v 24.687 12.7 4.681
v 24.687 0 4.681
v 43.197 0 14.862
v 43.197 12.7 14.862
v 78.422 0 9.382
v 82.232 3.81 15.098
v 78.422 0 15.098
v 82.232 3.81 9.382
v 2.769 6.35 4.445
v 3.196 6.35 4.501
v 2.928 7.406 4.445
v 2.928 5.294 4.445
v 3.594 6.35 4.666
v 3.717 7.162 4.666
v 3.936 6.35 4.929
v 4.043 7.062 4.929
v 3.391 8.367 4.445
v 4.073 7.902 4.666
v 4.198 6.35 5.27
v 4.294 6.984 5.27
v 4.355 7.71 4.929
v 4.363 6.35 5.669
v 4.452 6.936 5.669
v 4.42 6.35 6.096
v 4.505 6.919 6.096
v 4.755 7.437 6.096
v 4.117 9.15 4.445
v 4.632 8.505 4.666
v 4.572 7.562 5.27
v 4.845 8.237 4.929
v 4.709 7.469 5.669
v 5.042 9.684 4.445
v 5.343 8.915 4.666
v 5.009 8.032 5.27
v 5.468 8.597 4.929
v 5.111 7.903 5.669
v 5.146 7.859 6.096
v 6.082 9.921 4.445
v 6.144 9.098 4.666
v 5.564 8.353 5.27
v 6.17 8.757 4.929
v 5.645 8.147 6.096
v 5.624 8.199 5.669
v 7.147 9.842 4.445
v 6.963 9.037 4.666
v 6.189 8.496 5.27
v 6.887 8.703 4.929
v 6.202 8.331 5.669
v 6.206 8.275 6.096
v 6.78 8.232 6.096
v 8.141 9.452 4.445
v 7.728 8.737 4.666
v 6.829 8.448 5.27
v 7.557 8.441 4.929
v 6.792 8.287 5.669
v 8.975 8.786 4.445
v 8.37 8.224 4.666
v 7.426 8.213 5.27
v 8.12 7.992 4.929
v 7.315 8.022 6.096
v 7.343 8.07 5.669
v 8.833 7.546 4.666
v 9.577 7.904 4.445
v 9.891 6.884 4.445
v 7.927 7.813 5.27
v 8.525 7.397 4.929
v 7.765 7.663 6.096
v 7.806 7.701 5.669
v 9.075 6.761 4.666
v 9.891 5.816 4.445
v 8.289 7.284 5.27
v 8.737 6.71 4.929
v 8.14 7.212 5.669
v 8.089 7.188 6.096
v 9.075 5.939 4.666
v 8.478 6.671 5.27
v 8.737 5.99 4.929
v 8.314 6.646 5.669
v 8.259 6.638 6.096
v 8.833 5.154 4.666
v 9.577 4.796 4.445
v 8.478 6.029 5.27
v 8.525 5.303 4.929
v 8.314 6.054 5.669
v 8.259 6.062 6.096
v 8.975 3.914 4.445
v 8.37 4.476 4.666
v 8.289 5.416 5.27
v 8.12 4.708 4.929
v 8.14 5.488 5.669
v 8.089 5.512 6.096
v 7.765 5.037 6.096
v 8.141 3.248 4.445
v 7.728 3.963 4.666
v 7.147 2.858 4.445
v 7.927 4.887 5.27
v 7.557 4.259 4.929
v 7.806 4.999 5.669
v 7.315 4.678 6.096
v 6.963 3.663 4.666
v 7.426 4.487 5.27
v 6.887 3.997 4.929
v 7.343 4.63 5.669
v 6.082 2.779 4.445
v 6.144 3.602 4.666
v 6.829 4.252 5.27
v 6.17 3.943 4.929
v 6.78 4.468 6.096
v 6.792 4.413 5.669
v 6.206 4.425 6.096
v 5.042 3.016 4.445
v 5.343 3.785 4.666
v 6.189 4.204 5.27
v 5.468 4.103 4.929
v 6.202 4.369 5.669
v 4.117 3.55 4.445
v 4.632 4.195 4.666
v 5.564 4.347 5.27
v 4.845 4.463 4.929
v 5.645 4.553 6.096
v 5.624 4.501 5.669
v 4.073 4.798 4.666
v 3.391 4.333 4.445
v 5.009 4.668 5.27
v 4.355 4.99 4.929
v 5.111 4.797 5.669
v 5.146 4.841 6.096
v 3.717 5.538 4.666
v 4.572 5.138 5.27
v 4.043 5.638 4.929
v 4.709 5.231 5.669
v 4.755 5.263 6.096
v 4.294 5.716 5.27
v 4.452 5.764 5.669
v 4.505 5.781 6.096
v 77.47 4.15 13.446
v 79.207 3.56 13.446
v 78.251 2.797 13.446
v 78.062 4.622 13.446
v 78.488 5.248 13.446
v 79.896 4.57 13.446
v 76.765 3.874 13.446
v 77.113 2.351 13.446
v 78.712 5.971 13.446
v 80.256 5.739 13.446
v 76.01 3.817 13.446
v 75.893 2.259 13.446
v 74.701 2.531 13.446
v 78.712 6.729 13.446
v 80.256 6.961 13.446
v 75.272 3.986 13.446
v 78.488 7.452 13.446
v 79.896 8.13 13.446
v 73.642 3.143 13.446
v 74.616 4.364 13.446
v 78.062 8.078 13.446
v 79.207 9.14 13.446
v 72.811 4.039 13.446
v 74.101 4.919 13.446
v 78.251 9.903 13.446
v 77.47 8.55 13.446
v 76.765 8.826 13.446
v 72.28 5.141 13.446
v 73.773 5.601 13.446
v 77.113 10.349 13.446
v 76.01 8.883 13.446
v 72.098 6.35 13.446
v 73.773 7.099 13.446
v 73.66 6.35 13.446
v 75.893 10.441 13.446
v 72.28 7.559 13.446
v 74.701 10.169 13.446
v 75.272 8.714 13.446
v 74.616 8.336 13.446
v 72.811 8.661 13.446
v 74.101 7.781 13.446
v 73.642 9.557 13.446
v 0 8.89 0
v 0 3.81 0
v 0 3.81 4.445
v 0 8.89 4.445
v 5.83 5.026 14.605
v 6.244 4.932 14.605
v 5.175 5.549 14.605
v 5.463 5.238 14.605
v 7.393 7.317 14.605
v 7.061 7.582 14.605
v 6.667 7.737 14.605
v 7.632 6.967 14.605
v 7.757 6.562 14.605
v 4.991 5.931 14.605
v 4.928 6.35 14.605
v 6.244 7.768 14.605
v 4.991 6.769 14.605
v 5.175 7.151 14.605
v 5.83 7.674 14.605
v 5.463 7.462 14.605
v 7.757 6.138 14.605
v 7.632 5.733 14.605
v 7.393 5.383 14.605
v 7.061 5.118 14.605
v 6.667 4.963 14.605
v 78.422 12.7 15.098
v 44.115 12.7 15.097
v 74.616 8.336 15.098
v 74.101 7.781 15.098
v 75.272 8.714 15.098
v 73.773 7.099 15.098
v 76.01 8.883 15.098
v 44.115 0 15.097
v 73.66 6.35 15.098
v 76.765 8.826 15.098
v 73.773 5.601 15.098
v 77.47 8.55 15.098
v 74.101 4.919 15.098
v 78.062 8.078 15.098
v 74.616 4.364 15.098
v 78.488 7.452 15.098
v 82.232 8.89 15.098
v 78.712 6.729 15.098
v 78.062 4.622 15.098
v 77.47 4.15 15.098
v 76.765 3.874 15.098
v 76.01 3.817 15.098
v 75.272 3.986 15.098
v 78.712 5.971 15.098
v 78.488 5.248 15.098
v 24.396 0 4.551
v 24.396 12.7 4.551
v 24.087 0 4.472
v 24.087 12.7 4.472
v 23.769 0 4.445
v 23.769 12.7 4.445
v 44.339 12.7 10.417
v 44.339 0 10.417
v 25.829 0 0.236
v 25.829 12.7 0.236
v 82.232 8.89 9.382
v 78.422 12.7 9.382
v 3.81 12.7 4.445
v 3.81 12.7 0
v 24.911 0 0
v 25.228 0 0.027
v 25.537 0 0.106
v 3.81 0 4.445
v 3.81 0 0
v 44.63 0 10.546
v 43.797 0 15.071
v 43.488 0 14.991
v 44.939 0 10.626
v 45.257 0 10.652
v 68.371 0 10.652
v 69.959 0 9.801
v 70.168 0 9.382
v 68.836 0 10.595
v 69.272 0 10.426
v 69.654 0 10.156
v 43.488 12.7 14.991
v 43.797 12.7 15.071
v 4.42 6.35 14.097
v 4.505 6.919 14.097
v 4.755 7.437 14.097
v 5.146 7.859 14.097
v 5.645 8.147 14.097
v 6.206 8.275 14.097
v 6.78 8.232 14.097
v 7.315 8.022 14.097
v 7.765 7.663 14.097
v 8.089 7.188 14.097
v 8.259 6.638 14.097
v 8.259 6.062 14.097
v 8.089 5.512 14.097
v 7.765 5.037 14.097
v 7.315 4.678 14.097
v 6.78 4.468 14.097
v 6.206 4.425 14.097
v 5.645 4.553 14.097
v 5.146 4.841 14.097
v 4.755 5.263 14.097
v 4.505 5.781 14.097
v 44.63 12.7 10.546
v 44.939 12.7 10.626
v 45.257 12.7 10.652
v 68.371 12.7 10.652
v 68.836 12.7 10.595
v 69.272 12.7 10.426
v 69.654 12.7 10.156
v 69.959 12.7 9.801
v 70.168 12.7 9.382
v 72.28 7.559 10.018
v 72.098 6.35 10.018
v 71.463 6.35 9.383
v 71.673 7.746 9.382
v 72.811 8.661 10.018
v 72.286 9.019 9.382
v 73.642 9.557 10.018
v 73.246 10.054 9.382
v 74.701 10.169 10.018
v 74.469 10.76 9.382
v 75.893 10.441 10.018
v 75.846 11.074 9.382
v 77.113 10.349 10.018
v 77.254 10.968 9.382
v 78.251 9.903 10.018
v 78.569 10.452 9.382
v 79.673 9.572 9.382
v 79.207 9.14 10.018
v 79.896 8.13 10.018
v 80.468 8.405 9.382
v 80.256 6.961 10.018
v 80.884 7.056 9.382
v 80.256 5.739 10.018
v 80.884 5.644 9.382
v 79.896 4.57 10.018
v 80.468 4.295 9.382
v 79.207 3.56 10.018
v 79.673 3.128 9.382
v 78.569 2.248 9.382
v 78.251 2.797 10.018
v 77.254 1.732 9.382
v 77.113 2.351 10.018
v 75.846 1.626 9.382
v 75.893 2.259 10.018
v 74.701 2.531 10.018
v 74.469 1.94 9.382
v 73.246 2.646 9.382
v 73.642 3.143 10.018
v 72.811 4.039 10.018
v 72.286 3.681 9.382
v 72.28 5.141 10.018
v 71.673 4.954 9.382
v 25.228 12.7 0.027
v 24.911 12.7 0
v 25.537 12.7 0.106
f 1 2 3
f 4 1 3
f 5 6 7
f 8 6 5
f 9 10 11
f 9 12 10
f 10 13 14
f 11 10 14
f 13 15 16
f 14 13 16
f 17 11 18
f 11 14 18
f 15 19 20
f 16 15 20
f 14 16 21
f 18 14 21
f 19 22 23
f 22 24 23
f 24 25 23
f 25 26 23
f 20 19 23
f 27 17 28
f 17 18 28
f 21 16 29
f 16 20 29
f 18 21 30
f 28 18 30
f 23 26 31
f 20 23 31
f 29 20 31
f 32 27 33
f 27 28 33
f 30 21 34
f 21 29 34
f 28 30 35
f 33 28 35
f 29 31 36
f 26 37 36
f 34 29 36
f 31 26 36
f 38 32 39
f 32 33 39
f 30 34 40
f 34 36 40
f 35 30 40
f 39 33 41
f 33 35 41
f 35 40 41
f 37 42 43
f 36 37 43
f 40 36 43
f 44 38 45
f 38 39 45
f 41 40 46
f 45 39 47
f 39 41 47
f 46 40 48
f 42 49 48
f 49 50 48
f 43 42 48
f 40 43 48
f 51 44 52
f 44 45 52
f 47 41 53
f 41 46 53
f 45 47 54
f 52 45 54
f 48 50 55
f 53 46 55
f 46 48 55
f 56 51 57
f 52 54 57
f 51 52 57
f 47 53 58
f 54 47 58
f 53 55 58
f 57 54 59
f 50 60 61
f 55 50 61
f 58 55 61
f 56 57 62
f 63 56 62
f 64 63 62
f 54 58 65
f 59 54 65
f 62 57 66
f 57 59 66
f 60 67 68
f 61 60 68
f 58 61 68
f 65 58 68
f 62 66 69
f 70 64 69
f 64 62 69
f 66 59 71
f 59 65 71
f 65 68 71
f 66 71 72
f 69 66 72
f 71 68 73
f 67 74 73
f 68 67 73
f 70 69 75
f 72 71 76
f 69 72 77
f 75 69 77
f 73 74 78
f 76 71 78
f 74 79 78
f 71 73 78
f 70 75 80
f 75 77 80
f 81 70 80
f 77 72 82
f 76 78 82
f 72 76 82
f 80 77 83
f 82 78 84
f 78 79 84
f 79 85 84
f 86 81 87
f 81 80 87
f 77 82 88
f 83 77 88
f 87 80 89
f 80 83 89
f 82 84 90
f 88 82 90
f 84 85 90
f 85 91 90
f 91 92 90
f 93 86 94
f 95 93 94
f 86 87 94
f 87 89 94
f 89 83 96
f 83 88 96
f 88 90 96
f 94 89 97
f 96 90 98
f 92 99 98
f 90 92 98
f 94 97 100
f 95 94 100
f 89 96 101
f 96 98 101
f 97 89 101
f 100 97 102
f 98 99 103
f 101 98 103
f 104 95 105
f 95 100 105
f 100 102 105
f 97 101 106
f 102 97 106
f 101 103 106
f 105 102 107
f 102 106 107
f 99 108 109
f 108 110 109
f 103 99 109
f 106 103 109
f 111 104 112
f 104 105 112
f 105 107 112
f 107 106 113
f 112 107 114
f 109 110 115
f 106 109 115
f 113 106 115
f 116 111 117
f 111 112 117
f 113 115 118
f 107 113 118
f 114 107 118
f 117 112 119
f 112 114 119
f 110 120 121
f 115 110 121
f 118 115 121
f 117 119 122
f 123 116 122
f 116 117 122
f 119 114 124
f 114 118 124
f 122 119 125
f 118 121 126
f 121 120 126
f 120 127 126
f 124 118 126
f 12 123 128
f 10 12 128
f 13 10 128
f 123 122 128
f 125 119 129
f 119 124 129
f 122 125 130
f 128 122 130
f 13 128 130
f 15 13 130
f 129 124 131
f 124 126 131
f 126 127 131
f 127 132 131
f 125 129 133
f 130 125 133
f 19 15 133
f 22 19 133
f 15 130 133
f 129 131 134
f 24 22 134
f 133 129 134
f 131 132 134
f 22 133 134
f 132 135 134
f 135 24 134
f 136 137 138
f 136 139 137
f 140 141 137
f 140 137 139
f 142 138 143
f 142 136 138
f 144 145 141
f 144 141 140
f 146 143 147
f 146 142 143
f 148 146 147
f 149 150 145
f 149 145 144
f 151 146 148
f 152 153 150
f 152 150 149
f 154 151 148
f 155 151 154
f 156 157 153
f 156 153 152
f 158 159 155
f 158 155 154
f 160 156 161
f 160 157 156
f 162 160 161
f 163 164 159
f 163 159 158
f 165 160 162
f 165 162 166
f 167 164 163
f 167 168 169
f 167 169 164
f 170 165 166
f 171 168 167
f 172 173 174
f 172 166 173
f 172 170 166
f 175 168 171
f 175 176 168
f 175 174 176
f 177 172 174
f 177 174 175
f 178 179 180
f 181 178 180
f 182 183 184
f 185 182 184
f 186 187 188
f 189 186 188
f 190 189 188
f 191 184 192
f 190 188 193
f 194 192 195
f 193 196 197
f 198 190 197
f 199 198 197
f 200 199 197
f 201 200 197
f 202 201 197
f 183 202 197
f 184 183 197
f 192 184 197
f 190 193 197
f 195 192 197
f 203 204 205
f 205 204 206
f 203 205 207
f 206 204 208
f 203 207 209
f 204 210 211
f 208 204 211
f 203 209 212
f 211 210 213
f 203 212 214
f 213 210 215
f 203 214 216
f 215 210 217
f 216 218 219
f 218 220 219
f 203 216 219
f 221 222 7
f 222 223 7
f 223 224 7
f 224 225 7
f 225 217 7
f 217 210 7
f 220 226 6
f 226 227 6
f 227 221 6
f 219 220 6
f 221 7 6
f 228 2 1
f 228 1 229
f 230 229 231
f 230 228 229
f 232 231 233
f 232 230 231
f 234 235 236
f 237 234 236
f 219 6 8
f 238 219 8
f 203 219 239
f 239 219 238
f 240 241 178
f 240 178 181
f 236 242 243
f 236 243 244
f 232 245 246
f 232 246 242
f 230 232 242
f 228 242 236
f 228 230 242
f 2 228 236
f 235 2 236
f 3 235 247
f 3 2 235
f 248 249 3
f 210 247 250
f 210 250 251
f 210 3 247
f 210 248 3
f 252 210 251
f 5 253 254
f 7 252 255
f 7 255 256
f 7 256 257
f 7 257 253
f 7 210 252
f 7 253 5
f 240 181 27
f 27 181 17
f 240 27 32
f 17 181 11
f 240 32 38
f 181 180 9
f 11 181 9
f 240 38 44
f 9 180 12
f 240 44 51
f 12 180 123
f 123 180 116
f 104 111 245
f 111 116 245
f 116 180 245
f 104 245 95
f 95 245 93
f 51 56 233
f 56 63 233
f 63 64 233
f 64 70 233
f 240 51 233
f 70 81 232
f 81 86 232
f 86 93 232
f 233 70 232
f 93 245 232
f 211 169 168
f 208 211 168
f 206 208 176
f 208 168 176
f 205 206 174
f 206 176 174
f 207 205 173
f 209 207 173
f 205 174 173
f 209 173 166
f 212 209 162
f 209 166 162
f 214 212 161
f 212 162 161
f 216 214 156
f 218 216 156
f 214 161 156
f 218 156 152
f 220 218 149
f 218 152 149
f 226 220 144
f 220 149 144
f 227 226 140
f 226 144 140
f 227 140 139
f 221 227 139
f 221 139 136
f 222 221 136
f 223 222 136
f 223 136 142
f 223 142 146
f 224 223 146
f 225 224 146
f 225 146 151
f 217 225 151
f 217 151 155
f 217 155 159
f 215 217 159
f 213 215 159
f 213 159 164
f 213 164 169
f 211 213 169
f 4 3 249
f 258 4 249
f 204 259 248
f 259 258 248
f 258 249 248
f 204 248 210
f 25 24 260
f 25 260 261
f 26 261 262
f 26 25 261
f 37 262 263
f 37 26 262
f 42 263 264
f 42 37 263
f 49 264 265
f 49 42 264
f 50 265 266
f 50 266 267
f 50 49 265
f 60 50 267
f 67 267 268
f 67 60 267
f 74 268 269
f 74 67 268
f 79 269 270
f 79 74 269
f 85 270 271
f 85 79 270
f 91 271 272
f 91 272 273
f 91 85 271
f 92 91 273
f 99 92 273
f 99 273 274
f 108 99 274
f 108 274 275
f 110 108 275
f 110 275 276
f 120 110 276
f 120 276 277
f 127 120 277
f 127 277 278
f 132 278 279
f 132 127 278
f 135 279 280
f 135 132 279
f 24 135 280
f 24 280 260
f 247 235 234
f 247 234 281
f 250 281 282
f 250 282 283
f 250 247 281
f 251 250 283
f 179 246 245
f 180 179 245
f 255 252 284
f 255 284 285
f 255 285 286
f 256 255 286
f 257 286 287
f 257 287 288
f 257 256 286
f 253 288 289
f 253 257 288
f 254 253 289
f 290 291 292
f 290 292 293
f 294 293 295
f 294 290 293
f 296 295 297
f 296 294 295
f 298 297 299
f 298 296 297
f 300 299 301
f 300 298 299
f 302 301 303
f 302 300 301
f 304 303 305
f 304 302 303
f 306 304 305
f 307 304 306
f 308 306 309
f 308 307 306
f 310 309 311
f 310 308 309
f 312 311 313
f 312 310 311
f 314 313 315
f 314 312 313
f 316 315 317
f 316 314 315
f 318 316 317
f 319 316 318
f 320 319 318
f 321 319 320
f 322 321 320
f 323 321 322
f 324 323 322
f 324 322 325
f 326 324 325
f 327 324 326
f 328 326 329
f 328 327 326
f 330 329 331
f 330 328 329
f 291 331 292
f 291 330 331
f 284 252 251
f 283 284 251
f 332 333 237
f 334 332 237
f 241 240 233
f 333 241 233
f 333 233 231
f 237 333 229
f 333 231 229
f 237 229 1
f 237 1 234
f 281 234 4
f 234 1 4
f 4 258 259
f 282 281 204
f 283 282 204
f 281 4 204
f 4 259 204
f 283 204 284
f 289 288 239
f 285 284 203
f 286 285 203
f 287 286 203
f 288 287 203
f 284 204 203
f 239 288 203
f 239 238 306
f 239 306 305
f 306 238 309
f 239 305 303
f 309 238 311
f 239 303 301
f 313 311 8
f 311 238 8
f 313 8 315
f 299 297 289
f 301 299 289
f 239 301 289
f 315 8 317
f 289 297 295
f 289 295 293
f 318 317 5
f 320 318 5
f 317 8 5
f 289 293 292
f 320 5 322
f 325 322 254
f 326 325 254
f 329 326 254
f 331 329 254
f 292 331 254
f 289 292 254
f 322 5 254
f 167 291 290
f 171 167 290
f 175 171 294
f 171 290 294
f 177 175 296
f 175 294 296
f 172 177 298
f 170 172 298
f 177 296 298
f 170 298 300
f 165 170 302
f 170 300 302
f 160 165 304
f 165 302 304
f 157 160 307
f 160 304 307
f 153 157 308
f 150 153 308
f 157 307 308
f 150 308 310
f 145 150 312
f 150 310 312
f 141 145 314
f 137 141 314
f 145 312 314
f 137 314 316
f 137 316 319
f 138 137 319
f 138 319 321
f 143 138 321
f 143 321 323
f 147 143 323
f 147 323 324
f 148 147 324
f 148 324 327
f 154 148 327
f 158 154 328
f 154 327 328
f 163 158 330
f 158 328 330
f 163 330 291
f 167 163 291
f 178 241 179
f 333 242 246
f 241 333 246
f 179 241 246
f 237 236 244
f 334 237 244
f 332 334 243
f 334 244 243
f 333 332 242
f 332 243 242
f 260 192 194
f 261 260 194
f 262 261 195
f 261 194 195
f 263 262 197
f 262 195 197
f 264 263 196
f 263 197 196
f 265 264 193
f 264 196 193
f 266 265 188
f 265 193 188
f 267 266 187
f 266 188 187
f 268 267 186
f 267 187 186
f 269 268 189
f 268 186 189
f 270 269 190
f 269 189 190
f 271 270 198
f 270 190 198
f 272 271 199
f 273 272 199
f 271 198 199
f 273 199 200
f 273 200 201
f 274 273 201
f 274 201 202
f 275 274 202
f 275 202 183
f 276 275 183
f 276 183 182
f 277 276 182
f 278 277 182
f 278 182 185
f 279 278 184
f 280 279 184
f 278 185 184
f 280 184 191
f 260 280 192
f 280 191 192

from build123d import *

# Parameters (mm, degrees)
BOSS_EXTRUDE1_DEPTH = 12.7
SKETCH2_R           = 4.1021
CUT_EXTRUDE1_DEPTH  = 4.064
SKETCH3_R           = 2.54
CUT_EXTRUDE2_DEPTH  = 85.28690538
SKETCH4_R           = 1.9304
BOSS_EXTRUDE2_DEPTH = 10.16
FILLET1_R           = 1.651
CHAMFER1_SIZE       = 3.81
FILLET2_R           = 1.905
CHAMFER2_SIZE       = 0.635
CHAMFER3_SIZE       = 0.508


with BuildPart() as part:
    # Sketch1 → Boss-Extrude1 (new body)
    with BuildSketch(Plane(origin=(0, 0, 0), x_dir=(1, 0, 0), z_dir=(0, 1, 0))):
        Polygon((0, 0), (0, -4.445), (24.258236459, -4.445), (43.625736459, -15.0975), (82.2325, -15.0975), (82.2325, -9.3825), (70.1675, -9.3825), (70.1675, -10.6525), (44.7675, -10.6525), (25.4, 0), align=None)
    extrude(amount=BOSS_EXTRUDE1_DEPTH)

    # Sketch2 → Cut-Extrude1 (cut)
    with BuildSketch(Plane(origin=(0, 0, 9.3825), x_dir=(-1, 0, 0), z_dir=(0, 0, -1))):
        with Locations((-76.2, 6.35)):
            Circle(SKETCH2_R)
    extrude(amount=-CUT_EXTRUDE1_DEPTH, mode=Mode.SUBTRACT)

    # Sketch3 → Cut-Extrude2 (cut, through all)
    with BuildSketch(Plane(origin=(0, 0, 13.4465), x_dir=(-1, 0, 0), z_dir=(0, 0, -1))):
        with Locations((-76.2, 6.35)):
            Circle(SKETCH3_R)
    extrude(amount=-CUT_EXTRUDE2_DEPTH, mode=Mode.SUBTRACT)

    # Sketch4 → Boss-Extrude2 (add)
    with BuildSketch(Plane(origin=(0, 0, 4.445), x_dir=(-1, 0, 0), z_dir=(0, 0, -1))):
        with Locations((-6.35, 6.35)):
            Circle(SKETCH4_R)
    extrude(amount=-BOSS_EXTRUDE2_DEPTH)

    # Fillet1
    fillet1_edges = [part.edges().sort_by_distance(p)[0] for p in [
        (8.2804, 6.35, 4.445),
    ]]
    fillet(fillet1_edges, radius=FILLET1_R)

    # Chamfer1
    chamfer1_edges = [part.edges().sort_by_distance(p)[0] for p in [
        (82.2325, 0, 12.24),
        (0, 0, 2.2225),
        (82.2325, 12.7, 12.24),
        (0, 12.7, 2.2225),
    ]]
    chamfer(chamfer1_edges, length=CHAMFER1_SIZE)

    # Fillet2
    # the kernel refuses this fillet: 1.905 mm, written as the material it adds along each edge
    with BuildSketch(Plane(origin=(24.258236459, 0, 4.445), x_dir=(-1, 0, 0), z_dir=(0, 1, 0))) as fillet2_piece_1:
        with BuildLine():
            CenterArc((FILLET2_R * 0.256864688635, FILLET2_R), FILLET2_R, 241.188354533, 28.811645467)
            Line((-FILLET2_R * 0.225067086378, FILLET2_R * 0.123791255332), (0, 0))
            Line((0, 0), (FILLET2_R * 0.256864688635, 0))
        make_face()
    extrude(amount=12.7)
    with BuildSketch(Plane(origin=(44.7675, 0, 10.6525), x_dir=(-0.8762087446678116, 0, -0.4819317750134946), z_dir=(0, 1, 0))) as fillet2_piece_2:
        with BuildLine():
            CenterArc((FILLET2_R * 0.256864688635, -FILLET2_R), FILLET2_R, 90, 28.811645467)
            Line((-FILLET2_R * 0.225067086378, -FILLET2_R * 0.123791255332), (0, 0))
            Line((0, 0), (FILLET2_R * 0.256864688635, 0))
        make_face()
    extrude(amount=12.7)
    with BuildSketch(Plane(origin=(70.1675, 0, 10.6525), x_dir=(-1, 0, 0), z_dir=(0, 1, 0))) as fillet2_piece_3:
        with BuildLine():
            CenterArc((1.796051224, -1.905), FILLET2_R, 90, 70.528779366)
            Line((0, -1.27), (0, 0))
            Line((0, 0), (1.796051224, 0))
        make_face()
    extrude(amount=12.7)
    # the kernel refuses this fillet: 1.905 mm, written as the material it takes off along each edge
    with BuildSketch(Plane(origin=(43.625736459, -1.22331808, 15.0975), x_dir=(-0.8762087446678133, 0, -0.4819317750134918), z_dir=(0, 1, 0))) as fillet2_2_piece_1:
        with BuildLine():
            CenterArc((FILLET2_R * 0.256864688635, -FILLET2_R), FILLET2_R, 90, 28.811645467)
            Line((-FILLET2_R * 0.225067086378, -FILLET2_R * 0.123791255332), (0, 0))
            Line((0, 0), (FILLET2_R * 0.256864688635, 0))
        make_face()
    extrude(amount=15.146636159, mode=Mode.SUBTRACT)
    with BuildSketch(Plane(origin=(25.4, -1.22331808, 0), x_dir=(-1, 0, 0), z_dir=(0, 1, 0))) as fillet2_2_piece_2:
        with BuildLine():
            CenterArc((FILLET2_R * 0.256864688635, FILLET2_R), FILLET2_R, 241.188354533, 28.811645467)
            Line((-FILLET2_R * 0.225067086378, FILLET2_R * 0.123791255332), (0, 0))
            Line((0, 0), (FILLET2_R * 0.256864688635, 0))
        make_face()
    extrude(amount=15.146636159, mode=Mode.SUBTRACT)

    # Chamfer2
    chamfer2_edges = [part.edges().sort_by_distance(p)[0] for p in [
        (80.3021, 6.35, 9.3825),
    ]]
    chamfer(chamfer2_edges, length=CHAMFER2_SIZE)

    # Chamfer3
    chamfer3_edges = [part.edges().sort_by_distance(p)[0] for p in [
        (8.2804, 6.35, 14.605),
    ]]
    chamfer(chamfer3_edges, length=CHAMFER3_SIZE)


solid = part.part
